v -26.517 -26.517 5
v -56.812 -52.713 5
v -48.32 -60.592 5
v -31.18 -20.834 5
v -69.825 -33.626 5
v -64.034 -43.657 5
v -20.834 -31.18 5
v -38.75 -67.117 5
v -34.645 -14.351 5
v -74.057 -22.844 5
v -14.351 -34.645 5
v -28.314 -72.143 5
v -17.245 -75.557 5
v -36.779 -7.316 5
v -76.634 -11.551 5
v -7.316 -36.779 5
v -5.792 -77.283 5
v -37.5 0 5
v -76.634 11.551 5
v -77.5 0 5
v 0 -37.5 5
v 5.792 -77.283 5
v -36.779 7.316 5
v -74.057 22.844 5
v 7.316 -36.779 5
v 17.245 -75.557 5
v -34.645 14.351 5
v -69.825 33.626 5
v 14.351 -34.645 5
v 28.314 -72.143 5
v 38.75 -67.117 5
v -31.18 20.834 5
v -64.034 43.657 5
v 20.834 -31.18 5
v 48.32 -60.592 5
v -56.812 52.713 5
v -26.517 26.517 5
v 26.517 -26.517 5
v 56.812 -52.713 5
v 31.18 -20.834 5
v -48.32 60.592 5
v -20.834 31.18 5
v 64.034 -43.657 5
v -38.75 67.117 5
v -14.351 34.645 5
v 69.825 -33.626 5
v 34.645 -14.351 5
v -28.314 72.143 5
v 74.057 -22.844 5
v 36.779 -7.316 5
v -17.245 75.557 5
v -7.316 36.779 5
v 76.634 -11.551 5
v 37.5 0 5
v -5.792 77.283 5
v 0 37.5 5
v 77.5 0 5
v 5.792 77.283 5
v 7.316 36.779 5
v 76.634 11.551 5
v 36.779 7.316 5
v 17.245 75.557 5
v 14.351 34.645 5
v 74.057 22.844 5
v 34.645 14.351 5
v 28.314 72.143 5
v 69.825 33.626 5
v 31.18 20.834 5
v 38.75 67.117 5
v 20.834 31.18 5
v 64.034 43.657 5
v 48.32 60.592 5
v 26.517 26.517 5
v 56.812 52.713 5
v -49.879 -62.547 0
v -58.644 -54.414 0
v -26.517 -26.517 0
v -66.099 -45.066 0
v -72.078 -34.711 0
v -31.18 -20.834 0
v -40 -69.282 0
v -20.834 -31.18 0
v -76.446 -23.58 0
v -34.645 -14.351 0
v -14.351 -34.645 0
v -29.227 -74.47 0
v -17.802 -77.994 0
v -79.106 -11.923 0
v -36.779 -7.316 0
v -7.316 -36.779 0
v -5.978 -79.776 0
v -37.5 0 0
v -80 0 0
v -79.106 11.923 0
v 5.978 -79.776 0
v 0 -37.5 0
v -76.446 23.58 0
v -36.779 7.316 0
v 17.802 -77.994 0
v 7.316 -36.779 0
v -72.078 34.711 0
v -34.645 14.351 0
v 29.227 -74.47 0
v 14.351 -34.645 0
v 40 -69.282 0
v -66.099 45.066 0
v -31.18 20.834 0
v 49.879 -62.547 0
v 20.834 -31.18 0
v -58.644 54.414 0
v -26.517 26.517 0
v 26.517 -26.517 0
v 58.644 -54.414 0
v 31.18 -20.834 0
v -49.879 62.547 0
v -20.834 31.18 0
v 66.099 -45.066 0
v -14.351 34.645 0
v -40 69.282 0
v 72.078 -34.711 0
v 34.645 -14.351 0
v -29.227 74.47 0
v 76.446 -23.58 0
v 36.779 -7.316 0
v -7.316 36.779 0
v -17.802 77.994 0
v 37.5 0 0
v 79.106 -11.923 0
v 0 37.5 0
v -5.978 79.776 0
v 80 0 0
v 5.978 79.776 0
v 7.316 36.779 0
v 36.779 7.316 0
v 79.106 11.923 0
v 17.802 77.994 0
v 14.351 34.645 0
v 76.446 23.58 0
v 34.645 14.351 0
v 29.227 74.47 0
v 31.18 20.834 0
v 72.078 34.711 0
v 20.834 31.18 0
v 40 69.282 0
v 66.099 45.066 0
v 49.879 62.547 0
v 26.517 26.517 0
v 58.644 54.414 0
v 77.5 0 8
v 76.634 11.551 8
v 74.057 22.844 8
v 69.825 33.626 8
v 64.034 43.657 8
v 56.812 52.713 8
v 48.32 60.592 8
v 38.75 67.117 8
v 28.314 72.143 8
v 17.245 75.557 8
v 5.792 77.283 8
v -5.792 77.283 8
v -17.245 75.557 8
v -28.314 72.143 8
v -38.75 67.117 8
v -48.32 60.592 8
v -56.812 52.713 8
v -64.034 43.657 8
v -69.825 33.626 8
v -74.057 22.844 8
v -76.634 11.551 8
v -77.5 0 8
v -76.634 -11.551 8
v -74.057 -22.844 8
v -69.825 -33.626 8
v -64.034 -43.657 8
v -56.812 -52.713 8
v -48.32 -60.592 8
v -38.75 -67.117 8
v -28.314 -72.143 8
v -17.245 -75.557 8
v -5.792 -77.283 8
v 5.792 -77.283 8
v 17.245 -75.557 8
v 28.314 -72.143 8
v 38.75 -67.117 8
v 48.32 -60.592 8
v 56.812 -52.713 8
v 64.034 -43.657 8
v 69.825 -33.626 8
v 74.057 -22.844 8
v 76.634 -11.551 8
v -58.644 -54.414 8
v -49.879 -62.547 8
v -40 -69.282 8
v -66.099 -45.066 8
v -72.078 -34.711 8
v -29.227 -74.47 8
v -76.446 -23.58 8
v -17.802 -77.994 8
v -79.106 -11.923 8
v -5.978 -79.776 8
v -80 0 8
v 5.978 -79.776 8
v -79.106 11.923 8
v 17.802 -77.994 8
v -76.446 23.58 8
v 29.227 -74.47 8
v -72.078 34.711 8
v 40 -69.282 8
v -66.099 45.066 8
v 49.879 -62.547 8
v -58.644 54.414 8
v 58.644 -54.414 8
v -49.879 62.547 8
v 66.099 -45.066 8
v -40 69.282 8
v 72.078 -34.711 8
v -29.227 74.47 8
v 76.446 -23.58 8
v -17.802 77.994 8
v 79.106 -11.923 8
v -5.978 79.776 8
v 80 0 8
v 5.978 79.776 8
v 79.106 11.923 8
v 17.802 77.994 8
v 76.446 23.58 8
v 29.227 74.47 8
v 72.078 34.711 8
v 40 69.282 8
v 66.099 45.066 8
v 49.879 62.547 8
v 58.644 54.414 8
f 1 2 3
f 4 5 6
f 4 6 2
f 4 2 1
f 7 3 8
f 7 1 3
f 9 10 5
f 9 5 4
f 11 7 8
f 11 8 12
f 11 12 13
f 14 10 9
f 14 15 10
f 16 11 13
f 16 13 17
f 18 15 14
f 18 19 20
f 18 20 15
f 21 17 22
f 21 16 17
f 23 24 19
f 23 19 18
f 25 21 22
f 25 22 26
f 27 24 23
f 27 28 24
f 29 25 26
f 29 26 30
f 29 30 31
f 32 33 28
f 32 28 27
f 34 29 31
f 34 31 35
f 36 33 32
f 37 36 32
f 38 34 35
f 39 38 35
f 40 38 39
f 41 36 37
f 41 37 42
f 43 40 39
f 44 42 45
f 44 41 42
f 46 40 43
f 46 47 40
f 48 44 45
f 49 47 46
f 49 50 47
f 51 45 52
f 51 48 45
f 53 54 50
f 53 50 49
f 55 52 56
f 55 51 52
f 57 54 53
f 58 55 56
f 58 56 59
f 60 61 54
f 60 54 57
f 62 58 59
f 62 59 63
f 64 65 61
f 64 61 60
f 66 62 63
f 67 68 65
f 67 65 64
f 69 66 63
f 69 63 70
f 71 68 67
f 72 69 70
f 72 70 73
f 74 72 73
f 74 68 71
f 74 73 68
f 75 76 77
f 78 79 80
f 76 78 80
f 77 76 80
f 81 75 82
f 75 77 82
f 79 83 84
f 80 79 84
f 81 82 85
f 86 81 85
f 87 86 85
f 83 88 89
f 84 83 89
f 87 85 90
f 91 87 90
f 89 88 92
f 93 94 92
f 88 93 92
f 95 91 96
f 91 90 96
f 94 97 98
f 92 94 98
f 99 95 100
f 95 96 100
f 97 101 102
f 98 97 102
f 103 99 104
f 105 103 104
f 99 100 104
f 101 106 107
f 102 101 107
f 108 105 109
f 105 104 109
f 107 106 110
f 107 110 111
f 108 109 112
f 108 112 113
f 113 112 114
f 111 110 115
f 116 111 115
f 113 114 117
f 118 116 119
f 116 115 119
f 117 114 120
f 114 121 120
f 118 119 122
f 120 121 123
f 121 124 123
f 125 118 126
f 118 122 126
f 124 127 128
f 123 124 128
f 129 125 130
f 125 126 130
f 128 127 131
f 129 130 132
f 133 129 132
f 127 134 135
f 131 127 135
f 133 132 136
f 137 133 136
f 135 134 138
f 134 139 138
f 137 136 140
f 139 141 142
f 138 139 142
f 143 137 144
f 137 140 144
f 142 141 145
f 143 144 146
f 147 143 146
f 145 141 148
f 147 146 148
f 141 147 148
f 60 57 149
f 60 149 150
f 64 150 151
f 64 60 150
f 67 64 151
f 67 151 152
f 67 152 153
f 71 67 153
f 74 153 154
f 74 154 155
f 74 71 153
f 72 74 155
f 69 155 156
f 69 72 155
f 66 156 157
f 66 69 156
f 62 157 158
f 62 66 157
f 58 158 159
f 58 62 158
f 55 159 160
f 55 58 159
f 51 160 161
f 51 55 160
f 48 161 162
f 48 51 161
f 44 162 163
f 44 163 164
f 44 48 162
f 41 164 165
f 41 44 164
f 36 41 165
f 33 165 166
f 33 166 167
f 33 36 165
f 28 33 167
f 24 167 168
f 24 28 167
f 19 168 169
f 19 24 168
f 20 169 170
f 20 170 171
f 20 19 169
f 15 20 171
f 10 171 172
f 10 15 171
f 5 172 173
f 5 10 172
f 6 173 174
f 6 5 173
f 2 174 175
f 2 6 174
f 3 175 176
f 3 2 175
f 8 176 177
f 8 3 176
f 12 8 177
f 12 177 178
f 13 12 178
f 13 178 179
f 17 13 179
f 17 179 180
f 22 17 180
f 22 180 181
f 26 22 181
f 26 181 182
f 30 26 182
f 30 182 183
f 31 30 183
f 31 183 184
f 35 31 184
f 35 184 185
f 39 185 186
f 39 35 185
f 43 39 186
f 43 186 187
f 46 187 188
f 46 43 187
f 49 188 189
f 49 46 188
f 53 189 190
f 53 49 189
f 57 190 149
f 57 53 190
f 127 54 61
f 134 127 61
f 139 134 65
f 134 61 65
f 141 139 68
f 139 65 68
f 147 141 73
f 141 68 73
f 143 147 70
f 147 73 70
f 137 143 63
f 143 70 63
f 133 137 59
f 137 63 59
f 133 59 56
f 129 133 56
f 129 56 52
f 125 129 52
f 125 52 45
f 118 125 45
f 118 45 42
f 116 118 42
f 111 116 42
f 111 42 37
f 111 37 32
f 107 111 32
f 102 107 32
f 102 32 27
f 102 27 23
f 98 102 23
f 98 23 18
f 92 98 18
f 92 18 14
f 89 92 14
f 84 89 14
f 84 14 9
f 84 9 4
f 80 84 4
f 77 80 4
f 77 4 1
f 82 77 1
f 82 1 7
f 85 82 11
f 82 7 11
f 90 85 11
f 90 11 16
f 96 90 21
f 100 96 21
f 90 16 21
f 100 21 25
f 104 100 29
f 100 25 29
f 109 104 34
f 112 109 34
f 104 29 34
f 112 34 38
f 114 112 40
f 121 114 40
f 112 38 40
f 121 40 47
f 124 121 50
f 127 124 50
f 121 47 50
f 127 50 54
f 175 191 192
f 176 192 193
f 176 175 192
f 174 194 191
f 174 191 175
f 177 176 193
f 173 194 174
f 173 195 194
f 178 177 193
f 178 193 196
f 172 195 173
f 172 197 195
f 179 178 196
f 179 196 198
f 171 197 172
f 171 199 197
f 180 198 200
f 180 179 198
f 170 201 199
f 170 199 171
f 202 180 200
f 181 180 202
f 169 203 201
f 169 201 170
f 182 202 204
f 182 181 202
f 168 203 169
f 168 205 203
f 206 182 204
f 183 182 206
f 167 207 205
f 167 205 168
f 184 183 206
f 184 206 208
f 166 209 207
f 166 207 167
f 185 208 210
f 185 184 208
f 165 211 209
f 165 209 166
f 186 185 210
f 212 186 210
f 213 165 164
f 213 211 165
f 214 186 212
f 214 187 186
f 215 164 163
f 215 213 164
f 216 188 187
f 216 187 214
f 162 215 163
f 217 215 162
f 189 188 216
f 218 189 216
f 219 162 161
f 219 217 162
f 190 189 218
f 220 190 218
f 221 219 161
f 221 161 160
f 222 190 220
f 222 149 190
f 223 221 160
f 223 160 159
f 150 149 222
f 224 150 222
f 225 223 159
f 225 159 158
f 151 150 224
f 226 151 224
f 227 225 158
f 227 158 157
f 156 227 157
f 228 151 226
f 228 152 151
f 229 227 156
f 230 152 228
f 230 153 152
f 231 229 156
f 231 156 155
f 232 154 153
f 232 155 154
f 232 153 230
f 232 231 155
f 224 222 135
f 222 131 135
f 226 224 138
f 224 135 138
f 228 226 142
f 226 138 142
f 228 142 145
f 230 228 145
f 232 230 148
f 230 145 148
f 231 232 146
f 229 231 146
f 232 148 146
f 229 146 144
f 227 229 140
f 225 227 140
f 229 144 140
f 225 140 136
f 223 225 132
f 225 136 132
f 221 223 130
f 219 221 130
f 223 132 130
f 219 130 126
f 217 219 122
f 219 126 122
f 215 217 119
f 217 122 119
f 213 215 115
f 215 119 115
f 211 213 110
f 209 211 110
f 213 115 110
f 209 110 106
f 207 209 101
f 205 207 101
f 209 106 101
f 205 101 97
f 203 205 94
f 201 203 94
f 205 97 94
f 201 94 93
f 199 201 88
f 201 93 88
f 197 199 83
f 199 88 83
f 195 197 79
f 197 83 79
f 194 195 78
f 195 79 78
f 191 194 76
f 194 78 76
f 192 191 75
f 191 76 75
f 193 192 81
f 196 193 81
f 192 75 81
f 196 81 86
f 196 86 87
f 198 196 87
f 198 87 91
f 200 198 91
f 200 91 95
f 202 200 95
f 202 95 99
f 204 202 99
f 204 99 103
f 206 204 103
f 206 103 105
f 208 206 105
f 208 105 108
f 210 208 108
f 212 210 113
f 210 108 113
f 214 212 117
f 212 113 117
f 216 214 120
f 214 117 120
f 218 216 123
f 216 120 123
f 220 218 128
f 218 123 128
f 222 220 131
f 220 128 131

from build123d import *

# Parameters (mm, degrees)
F0_R     = 80
F1_DEPTH = 5
F2_R     = 37.5
F3_DEPTH = 5.001
F4_R     = 80
F4_R_2   = 77.5
F5_DEPTH = 3


with BuildPart() as f1:
    # F0 (on Top) → F1 (new body)
    with BuildSketch(Plane.XY):
        Circle(F0_R)
    extrude(amount=F1_DEPTH)

    # F2 (on face) → F3 (cut, through all)
    with BuildSketch(Plane.XY.offset(5)):
        Circle(F2_R)
    extrude(amount=-F3_DEPTH, mode=Mode.SUBTRACT)

    # F4 (on face) → F5 (join)
    with BuildSketch(Plane.XY.offset(5)):
        Circle(F4_R)
        Circle(F4_R_2, mode=Mode.SUBTRACT)
    extrude(amount=F5_DEPTH)


solid = f1.part
